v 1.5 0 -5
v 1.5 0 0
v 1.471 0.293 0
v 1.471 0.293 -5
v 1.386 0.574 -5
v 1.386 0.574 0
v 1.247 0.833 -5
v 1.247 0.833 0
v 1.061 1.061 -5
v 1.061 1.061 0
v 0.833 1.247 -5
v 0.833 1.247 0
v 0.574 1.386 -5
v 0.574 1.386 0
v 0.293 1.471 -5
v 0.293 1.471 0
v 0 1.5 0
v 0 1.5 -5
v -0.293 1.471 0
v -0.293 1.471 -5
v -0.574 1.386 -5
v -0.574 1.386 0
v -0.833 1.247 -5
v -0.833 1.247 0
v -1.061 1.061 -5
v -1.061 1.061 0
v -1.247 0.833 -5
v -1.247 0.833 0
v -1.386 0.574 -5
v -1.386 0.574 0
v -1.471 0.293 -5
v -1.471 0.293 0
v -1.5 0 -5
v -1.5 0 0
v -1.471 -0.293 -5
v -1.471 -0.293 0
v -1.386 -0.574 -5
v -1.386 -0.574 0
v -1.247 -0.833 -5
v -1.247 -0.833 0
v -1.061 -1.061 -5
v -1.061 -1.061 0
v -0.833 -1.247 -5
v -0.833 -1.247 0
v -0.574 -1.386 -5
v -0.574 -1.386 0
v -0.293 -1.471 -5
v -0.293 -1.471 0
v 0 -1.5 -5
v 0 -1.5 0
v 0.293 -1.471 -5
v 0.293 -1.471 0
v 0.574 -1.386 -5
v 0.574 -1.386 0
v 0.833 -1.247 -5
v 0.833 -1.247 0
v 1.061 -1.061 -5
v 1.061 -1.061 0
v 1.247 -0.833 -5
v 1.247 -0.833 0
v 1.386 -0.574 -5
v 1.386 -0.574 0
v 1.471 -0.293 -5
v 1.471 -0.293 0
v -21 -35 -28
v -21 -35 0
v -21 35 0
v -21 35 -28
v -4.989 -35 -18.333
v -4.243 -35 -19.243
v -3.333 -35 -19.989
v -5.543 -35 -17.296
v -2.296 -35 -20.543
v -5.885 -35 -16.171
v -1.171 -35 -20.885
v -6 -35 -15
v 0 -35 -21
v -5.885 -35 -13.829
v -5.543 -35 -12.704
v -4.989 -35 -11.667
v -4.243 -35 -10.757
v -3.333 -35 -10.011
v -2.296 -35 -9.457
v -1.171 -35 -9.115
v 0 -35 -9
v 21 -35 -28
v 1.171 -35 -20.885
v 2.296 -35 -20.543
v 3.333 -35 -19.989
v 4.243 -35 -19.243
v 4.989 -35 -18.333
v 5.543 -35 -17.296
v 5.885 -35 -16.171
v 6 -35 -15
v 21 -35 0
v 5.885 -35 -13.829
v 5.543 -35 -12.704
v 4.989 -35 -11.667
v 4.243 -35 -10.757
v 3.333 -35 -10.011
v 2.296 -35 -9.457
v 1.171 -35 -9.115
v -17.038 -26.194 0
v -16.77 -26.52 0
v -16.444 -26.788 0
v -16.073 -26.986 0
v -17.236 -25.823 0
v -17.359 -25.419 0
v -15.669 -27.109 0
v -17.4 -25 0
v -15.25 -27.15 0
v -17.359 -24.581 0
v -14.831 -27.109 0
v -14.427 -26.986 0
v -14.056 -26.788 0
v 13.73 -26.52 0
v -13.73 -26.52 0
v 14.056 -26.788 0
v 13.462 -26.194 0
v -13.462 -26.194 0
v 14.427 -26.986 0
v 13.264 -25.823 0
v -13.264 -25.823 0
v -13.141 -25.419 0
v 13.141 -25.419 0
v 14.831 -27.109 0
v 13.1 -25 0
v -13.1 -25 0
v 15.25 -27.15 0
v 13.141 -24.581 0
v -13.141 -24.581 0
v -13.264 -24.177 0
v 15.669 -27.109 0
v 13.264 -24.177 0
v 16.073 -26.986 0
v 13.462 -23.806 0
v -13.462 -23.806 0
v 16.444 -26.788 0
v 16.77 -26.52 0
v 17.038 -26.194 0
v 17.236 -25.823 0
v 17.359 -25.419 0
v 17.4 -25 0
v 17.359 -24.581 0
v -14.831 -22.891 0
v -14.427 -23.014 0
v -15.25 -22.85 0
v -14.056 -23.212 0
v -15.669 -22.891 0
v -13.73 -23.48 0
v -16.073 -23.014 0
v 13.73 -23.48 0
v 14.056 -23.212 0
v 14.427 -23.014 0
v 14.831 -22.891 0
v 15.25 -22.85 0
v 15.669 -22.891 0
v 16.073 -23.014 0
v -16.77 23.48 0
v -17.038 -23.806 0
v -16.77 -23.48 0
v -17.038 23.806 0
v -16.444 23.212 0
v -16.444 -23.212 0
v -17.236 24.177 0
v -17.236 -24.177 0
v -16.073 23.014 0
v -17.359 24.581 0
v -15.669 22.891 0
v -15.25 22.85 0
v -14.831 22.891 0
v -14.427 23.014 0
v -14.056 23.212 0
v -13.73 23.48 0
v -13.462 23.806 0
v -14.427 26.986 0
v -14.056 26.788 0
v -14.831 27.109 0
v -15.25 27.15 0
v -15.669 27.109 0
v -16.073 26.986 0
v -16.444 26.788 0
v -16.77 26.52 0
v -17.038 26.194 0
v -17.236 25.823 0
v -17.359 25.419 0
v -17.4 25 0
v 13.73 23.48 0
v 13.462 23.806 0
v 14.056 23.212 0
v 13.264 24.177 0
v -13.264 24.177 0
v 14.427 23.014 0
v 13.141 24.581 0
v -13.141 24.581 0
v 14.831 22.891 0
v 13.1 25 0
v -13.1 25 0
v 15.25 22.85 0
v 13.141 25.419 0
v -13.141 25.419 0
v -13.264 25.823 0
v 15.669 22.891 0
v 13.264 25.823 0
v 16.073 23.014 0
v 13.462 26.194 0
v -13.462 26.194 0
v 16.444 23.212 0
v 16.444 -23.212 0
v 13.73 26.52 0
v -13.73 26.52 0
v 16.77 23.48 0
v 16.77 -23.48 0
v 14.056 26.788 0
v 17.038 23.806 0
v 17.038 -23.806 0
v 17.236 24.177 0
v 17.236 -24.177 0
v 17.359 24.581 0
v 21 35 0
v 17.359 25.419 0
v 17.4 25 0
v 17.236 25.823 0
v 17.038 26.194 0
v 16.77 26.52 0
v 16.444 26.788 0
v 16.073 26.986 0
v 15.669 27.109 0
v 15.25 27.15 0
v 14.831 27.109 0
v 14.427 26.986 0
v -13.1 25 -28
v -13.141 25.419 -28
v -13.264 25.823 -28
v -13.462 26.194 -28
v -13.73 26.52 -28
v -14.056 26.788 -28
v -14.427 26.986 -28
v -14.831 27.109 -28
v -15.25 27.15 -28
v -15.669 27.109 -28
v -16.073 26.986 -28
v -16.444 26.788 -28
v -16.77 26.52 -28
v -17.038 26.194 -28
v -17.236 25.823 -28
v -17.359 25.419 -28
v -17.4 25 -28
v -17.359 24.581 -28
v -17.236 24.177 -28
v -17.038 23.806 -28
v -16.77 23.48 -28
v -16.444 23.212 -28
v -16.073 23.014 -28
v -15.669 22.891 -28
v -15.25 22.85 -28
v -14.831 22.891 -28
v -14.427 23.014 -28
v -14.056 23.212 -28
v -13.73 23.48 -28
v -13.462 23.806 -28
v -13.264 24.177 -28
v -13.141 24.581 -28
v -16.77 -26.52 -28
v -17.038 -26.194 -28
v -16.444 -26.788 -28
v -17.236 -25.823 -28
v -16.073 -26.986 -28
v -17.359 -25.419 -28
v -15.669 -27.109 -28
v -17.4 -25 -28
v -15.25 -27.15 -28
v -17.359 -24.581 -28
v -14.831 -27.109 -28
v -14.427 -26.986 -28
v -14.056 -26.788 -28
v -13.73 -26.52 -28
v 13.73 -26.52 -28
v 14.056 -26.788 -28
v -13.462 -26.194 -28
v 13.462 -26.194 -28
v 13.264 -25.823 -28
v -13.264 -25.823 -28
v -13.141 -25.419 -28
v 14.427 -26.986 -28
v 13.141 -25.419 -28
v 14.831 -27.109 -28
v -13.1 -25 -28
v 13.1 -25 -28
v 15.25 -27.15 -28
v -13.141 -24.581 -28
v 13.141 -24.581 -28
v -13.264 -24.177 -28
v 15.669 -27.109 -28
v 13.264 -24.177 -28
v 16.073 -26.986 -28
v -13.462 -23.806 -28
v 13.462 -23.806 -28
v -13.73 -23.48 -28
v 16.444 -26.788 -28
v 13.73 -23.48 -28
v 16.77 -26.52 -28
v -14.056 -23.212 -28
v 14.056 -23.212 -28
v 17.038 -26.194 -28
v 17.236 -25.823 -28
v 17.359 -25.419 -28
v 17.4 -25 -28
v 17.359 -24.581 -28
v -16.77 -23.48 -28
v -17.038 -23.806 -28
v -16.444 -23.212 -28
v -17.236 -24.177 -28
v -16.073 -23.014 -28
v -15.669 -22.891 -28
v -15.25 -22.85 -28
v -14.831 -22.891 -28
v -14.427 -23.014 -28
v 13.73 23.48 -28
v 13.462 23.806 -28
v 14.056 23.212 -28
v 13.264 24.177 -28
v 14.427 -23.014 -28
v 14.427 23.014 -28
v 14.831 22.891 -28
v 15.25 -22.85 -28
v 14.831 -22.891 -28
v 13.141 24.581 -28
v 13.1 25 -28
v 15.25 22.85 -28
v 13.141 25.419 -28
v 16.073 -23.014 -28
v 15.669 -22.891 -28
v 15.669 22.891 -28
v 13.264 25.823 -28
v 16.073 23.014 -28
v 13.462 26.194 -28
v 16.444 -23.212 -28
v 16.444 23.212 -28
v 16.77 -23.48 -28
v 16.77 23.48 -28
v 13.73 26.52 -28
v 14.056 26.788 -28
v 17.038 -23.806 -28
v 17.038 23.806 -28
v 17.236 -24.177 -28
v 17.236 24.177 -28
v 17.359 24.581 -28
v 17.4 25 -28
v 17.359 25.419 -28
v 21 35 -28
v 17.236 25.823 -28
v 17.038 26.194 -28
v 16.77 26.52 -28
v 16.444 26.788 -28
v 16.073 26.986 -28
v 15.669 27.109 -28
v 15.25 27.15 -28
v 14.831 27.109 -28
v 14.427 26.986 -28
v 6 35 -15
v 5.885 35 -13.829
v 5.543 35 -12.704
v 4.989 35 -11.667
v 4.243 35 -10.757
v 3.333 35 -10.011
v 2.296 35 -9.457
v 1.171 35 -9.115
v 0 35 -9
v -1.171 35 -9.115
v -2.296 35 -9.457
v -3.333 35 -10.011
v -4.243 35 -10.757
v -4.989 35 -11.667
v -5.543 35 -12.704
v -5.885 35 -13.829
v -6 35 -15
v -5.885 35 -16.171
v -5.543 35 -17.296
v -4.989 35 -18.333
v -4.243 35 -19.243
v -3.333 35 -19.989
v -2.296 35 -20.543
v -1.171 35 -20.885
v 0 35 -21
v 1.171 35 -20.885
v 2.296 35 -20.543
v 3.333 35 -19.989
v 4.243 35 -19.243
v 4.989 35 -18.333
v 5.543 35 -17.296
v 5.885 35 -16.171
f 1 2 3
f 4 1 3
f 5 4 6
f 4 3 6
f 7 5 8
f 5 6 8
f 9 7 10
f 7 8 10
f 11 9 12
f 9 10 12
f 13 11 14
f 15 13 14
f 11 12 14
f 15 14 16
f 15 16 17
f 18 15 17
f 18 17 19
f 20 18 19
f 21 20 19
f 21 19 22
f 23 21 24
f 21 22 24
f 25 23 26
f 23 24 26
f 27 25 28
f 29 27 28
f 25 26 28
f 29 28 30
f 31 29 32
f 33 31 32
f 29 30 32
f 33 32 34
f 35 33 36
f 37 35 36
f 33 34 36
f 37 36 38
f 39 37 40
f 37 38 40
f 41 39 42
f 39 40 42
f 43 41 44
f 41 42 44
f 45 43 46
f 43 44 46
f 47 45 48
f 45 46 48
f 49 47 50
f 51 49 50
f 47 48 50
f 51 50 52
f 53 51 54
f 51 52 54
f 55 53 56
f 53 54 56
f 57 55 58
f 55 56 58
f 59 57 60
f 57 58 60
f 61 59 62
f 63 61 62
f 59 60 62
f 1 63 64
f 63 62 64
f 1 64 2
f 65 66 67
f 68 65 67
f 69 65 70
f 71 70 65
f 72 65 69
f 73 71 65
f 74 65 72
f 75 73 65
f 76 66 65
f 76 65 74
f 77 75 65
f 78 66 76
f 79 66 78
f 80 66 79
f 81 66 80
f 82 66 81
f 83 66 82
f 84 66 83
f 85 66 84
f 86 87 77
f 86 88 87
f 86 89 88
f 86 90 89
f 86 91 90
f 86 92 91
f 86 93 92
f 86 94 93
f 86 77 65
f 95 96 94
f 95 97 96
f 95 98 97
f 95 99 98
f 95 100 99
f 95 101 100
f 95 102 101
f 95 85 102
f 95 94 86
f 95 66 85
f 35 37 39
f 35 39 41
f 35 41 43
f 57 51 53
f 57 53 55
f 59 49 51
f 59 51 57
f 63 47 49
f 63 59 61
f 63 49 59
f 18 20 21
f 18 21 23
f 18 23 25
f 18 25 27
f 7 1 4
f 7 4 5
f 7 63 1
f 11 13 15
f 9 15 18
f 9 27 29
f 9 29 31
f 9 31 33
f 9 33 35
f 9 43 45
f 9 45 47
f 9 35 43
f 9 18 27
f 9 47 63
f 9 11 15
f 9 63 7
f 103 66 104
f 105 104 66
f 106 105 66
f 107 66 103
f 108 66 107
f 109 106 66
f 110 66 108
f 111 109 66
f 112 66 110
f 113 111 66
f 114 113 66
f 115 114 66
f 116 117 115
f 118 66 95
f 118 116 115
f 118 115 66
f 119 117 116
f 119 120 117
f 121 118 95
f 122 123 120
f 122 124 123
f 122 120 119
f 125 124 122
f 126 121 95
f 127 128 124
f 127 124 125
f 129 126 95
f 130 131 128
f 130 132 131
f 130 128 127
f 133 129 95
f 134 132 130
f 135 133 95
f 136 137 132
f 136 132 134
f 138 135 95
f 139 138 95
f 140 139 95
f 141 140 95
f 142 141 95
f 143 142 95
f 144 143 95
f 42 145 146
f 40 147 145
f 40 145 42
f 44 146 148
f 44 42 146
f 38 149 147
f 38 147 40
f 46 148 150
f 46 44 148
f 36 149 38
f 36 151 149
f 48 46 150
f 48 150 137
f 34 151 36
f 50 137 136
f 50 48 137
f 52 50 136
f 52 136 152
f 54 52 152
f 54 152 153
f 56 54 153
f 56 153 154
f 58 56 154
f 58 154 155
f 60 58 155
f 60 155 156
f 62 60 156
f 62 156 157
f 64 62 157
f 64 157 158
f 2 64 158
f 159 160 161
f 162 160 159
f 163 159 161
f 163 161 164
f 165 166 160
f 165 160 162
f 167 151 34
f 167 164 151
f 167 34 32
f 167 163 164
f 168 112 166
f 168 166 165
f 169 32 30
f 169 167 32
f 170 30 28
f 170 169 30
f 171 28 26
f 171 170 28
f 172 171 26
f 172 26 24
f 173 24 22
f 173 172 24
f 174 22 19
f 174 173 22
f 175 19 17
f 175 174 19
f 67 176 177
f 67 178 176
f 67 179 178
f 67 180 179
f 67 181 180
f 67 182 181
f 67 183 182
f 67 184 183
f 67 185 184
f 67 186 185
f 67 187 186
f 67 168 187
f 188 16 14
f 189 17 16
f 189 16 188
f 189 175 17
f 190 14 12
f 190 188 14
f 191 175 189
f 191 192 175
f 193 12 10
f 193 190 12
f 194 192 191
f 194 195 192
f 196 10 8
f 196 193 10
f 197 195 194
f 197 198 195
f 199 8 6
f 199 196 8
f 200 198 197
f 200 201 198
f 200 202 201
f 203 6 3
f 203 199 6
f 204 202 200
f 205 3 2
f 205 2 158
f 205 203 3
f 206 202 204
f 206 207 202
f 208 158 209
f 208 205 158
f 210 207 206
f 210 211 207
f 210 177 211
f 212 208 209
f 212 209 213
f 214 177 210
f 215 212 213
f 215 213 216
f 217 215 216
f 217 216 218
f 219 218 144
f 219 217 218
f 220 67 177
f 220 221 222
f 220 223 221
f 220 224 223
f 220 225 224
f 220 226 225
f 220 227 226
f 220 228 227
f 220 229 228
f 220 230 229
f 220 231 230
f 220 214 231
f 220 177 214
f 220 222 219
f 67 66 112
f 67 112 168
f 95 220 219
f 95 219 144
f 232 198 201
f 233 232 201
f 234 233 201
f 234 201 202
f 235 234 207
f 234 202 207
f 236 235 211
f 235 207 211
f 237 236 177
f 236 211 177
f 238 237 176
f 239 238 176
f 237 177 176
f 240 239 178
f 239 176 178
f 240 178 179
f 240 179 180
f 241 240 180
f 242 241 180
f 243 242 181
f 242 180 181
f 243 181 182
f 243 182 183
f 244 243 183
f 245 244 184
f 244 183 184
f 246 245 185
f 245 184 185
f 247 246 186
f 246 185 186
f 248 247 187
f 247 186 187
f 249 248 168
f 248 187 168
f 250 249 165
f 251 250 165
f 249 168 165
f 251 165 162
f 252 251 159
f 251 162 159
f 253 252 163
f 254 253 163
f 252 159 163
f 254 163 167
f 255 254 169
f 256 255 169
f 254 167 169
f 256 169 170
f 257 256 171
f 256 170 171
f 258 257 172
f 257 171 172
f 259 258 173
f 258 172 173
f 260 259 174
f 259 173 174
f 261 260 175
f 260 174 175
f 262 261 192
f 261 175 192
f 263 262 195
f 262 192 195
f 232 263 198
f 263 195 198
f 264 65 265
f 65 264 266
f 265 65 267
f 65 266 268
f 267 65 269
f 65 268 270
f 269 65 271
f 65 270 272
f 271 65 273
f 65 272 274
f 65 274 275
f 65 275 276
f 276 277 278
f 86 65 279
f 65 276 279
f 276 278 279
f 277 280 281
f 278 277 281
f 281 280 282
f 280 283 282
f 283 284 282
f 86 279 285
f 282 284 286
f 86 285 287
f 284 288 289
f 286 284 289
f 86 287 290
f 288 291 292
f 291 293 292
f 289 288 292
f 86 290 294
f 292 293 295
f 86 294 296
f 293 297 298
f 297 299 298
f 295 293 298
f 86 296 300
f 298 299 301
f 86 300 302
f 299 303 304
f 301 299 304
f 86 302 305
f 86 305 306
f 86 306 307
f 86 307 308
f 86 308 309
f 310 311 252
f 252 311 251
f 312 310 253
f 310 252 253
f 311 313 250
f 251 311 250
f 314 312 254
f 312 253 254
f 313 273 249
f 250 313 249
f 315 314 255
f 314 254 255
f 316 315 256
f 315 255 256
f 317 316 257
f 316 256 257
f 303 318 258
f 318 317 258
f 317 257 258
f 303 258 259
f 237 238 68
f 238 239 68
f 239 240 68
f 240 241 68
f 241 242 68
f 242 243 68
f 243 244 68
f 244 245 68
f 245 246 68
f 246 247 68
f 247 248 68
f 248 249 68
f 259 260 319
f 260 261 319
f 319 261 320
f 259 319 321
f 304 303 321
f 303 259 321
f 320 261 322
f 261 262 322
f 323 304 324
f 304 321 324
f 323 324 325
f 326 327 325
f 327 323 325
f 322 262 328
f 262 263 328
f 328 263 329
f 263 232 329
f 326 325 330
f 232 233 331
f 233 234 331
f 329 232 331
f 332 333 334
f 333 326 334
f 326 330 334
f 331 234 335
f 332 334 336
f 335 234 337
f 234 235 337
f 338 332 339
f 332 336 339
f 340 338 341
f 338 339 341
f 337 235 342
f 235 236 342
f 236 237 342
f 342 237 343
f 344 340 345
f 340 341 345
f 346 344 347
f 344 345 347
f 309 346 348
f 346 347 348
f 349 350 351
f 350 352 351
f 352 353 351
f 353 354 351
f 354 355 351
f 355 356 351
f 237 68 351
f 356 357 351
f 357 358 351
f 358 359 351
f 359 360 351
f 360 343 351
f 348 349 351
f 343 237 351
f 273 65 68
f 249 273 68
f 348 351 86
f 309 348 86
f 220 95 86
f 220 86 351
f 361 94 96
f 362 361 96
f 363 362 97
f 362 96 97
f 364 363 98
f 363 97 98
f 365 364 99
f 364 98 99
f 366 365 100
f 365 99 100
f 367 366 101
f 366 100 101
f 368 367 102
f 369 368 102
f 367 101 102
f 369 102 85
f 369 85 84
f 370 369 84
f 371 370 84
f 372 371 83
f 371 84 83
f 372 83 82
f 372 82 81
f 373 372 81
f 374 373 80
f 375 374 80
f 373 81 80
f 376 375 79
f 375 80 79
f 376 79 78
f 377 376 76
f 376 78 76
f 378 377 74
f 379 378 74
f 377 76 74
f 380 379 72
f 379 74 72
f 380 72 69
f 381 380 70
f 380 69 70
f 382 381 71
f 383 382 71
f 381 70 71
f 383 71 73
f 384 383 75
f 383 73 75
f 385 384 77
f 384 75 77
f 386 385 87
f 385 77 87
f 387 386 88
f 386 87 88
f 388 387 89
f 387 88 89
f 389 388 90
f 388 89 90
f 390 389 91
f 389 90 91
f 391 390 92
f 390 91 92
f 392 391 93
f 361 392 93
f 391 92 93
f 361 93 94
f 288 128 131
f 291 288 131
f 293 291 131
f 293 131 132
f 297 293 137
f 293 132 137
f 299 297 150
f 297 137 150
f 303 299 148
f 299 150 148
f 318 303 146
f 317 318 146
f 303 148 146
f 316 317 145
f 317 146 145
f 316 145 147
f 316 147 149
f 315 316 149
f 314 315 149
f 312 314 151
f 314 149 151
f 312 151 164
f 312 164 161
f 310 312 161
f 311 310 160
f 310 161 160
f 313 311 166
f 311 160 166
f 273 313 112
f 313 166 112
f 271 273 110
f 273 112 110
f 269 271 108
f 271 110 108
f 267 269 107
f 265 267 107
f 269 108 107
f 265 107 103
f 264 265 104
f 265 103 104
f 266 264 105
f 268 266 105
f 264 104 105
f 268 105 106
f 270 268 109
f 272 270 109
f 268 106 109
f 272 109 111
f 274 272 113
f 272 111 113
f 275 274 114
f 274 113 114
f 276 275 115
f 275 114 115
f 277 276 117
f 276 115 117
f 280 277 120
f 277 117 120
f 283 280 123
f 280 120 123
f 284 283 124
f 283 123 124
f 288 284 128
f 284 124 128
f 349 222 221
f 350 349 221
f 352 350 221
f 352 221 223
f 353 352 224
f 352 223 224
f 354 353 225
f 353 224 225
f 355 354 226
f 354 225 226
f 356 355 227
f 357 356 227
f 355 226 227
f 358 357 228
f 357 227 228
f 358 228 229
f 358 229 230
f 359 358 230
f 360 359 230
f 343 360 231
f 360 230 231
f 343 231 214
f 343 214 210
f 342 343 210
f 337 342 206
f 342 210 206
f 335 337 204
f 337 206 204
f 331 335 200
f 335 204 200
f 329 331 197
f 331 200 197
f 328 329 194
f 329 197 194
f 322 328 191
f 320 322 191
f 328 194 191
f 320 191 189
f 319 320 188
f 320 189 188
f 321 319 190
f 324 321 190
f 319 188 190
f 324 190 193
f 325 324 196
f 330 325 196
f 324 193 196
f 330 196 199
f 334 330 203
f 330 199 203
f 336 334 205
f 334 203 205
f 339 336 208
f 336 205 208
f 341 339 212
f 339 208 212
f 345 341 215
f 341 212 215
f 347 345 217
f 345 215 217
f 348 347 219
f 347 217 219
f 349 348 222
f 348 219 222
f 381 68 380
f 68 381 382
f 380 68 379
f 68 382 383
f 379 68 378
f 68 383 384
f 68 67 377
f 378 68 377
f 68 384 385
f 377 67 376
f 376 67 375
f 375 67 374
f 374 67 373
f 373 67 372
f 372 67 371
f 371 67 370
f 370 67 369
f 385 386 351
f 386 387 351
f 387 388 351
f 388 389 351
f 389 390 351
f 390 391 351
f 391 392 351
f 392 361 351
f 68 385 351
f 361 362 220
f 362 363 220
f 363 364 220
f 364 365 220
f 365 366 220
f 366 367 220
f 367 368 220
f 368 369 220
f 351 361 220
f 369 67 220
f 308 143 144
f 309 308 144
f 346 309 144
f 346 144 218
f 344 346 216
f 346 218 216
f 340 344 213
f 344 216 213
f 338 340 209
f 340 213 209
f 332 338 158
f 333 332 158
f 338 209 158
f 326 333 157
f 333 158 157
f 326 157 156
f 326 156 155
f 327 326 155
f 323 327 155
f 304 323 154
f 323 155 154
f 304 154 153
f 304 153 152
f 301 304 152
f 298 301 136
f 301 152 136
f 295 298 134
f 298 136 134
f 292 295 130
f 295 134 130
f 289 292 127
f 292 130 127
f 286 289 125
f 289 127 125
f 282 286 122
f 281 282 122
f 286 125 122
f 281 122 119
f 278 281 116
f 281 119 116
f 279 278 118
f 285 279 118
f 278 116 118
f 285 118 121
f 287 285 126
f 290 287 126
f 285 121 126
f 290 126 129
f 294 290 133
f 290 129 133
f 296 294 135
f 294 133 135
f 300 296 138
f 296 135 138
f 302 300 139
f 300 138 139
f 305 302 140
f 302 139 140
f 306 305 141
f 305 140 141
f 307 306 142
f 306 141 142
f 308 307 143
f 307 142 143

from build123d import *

# Parameters (mm, degrees)
F0_W     = 42
F0_H     = 70
F0_R     = 2.15
F1_DEPTH = 28
F2_R     = 6
F3_DEPTH = 70
F4_R     = 1.5
F5_DEPTH = 5


with BuildPart() as f1:
    # F0 (on Top) → F1 (new body)
    with BuildSketch(Plane.XY):
        Rectangle(F0_W, F0_H)
        with Locations((-15.25, -25)):
            Circle(F0_R, mode=Mode.SUBTRACT)
        with Locations((15.25, -25)):
            Circle(F0_R, mode=Mode.SUBTRACT)
        with Locations((-15.25, 25)):
            Circle(F0_R, mode=Mode.SUBTRACT)
        with Locations((15.25, 25)):
            Circle(F0_R, mode=Mode.SUBTRACT)
    extrude(amount=-F1_DEPTH)

    # F2 (on face) → F3 (cut)
    with BuildSketch(Plane.XZ.offset(35)):
        with Locations((0, -15)):
            Circle(F2_R)
    extrude(amount=-F3_DEPTH, mode=Mode.SUBTRACT)

    # F4 (on face) → F5 (cut)
    with BuildSketch(Plane.XY):
        Circle(F4_R)
    extrude(amount=-F5_DEPTH, mode=Mode.SUBTRACT)


solid = f1.part
